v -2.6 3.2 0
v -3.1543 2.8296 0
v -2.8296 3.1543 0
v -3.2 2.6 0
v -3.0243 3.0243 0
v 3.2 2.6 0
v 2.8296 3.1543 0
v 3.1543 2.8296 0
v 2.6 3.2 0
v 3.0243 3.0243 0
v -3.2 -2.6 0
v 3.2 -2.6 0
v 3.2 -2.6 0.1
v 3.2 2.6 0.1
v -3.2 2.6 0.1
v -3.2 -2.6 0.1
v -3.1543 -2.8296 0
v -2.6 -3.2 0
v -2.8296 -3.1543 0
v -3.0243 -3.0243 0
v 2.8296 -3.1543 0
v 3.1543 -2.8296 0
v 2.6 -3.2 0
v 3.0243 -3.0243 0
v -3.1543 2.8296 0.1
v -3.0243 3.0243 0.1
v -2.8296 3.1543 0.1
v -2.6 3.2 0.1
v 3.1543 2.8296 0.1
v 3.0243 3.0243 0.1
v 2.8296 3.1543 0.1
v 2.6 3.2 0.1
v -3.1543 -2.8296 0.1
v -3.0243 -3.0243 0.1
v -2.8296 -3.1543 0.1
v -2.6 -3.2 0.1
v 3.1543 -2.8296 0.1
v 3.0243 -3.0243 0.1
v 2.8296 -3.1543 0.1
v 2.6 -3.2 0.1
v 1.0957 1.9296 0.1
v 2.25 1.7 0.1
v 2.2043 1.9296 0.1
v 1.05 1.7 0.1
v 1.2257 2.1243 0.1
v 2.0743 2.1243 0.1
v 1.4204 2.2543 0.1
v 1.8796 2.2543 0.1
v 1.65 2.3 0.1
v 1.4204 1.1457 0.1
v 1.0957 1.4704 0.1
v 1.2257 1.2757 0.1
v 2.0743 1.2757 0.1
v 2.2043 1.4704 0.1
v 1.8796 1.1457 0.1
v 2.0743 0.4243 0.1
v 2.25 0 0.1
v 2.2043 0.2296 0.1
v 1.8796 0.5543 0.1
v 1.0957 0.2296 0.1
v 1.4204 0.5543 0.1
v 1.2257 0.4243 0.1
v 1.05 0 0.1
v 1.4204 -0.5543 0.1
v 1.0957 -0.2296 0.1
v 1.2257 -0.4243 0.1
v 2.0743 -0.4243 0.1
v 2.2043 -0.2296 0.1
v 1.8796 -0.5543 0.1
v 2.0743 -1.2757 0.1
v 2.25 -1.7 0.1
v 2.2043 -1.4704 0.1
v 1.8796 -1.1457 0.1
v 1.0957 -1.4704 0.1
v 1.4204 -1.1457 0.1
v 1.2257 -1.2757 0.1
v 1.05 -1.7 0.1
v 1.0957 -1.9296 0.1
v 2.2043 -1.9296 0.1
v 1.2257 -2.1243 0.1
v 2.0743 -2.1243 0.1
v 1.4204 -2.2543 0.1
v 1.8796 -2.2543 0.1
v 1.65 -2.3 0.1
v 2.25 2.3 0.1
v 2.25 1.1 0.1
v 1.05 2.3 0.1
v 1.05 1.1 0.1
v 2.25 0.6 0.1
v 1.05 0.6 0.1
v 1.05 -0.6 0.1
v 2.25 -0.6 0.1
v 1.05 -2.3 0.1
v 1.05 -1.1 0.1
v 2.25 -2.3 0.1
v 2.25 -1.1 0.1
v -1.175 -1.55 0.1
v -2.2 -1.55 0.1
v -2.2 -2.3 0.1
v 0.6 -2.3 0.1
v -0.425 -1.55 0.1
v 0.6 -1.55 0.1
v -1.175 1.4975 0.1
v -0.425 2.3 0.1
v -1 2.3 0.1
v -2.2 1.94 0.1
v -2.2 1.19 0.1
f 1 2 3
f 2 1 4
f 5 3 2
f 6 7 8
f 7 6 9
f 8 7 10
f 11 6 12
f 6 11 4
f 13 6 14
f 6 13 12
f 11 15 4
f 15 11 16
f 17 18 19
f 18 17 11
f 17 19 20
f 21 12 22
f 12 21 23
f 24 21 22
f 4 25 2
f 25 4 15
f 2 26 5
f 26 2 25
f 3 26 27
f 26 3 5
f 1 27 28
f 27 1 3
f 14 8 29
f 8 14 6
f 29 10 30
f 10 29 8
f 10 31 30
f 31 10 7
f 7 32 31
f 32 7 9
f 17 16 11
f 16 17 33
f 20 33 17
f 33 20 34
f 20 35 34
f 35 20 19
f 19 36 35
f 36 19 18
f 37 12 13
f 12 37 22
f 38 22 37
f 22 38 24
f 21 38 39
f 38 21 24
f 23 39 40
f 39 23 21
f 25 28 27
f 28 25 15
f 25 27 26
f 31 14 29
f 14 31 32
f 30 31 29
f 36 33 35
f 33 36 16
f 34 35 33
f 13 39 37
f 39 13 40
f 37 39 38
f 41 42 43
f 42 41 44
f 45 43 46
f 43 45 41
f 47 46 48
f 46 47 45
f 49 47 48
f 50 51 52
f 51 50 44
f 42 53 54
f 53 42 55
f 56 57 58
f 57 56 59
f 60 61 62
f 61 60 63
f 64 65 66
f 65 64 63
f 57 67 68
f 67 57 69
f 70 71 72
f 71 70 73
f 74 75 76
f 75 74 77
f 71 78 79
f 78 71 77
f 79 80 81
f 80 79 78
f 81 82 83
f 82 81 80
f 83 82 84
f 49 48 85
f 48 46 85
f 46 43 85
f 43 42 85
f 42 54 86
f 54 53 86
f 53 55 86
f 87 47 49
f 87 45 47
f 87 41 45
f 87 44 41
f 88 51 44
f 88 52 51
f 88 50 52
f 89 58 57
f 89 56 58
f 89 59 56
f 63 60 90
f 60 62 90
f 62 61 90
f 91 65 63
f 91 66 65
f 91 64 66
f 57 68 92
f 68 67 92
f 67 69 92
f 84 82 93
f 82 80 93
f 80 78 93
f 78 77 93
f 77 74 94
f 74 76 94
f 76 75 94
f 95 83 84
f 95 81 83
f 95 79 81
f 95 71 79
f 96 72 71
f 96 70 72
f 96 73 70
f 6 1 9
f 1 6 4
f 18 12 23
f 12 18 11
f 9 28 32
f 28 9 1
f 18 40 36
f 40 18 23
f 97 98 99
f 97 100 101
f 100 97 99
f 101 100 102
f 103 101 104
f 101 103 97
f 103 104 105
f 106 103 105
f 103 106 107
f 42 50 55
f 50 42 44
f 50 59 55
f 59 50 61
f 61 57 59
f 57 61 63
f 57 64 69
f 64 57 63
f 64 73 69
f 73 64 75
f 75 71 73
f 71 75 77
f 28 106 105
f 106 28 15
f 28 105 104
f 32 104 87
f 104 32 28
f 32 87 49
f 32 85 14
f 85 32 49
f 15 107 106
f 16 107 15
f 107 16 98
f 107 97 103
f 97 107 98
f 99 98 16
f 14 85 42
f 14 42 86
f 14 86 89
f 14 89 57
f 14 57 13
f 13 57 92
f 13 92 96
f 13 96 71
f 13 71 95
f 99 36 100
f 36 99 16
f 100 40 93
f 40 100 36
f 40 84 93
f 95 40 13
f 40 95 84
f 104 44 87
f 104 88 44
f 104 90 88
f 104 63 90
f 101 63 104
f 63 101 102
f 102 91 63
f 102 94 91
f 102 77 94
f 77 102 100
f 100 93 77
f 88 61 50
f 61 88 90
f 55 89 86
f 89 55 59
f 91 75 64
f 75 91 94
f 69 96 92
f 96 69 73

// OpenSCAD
// file: ../p/box3u12.scad
use <../lib.scad>
function ldraw_lib__box3u12() = [
// 0 Box with 3 Parallel Faces without Any Edges
// 0 Name: box3u12.dat
// 0 Author: J.C. Tchang [tchang]
// 0 !LDRAW_ORG Primitive UPDATE 2014-02
// 0 !LICENSE Licensed under CC BY 4.0 : see CAreadme.txt
// 
// 0 BFC CERTIFY CCW
  [0,"BFC","CERTIFY"],
  [0,"BFC","CCW"],
// 
// 0 !HISTORY 2014-12-23 [PTadmin] Official Update 2014-02
// 
// 
// 4 16 -1 1 1 1 1 1 1 1 -1 -1 1 -1
  [4,16,-1,1,1,1,1,1,1,1,-1,-1,1,-1],
// 4 16 -1 1 1 -1 0 1 1 0 1 1 1 1
  [4,16,-1,1,1,-1,0,1,1,0,1,1,1,1],
// 4 16 1 1 -1 1 0 -1 -1 0 -1 -1 1 -1
  [4,16,1,1,-1,1,0,-1,-1,0,-1,-1,1,-1],
];
module ldraw_lib__box3u12(step=0, col=false, unit=2/5, alt=false, line=0.2, solid=!$preview)
    makepoly(ldraw_lib__box3u12(), step=step, col=col, unit=unit, alt=alt, line=line, solid=solid);
ldraw_lib__box3u12(line=0.2);
// file: ../p/7-16ndis.scad
use <../lib.scad>
function ldraw_lib__7_16ndis() = [
// 0 Disc Negative 0.4375
// 0 Name: 7-16ndis.dat
// 0 Author: Alex Taylor [anathema]
// 0 !LDRAW_ORG Primitive UPDATE 2010-01
// 0 !LICENSE Licensed under CC BY 4.0 : see CAreadme.txt
// 
// 0 BFC CERTIFY CCW
  [0,"BFC","CERTIFY"],
  [0,"BFC","CCW"],
// 
// 0 !HISTORY 2010-04-05 [PTadmin] Official Update 2010-01
// 
// 
// 3 16 1 0 1 0.9239 0 0.3827 1 0 0
  [3,16,1,0,1,0.9239,0,0.3827,1,0,0],
// 3 16 1 0 1 0.7071 0 0.7071 0.9239 0 0.3827
  [3,16,1,0,1,0.7071,0,0.7071,0.9239,0,0.3827],
// 3 16 1 0 1 0.3827 0 0.9239 0.7071 0 0.7071
  [3,16,1,0,1,0.3827,0,0.9239,0.7071,0,0.7071],
// 3 16 1 0 1 0 0 1 0.3827 0 0.9239
  [3,16,1,0,1,0,0,1,0.3827,0,0.9239],
// 3 16 -1 0 1 -0.3827 0 0.9239 0 0 1
  [3,16,-1,0,1,-0.3827,0,0.9239,0,0,1],
// 3 16 -1 0 1 -0.7071 0 0.7071 -0.3827 0 0.9239
  [3,16,-1,0,1,-0.7071,0,0.7071,-0.3827,0,0.9239],
// 3 16 -1 0 1 -0.9239 0 0.3827 -0.7071 0 0.7071
  [3,16,-1,0,1,-0.9239,0,0.3827,-0.7071,0,0.7071],
// 0
];
module ldraw_lib__7_16ndis(step=0, col=false, unit=2/5, alt=false, line=0.2, solid=!$preview)
    makepoly(ldraw_lib__7_16ndis(), step=step, col=col, unit=unit, alt=alt, line=line, solid=solid);
ldraw_lib__7_16ndis(line=0.2);
// file: ../p/3-16ndis.scad
use <../lib.scad>
function ldraw_lib__3_16ndis() = [
// 0 Disc Negative 0.1875
// 0 Name: 3-16ndis.dat
// 0 Author: Magnus Forsberg [MagFors]
// 0 !LDRAW_ORG Primitive UPDATE 2024-01
// 0 !LICENSE Licensed under CC BY 4.0 : see CAreadme.txt
// 
// 0 BFC CERTIFY CCW
  [0,"BFC","CERTIFY"],
  [0,"BFC","CCW"],
// 
// 0 !HISTORY 2009-05-02 [PTadmin] Official Update 2009-01
// 0 !HISTORY 2024-01-03 [MagFors] Complete regeneration, original by guyvivan
// 0 !HISTORY 2024-01-29 [OrionP] Official Update 2024-01
// 
// 3 16 1 0 1 0.9239 0 0.3827 1 0 0
  [3,16,1,0,1,0.9239,0,0.3827,1,0,0],
// 3 16 1 0 1 0.7071 0 0.7071 0.9239 0 0.3827
  [3,16,1,0,1,0.7071,0,0.7071,0.9239,0,0.3827],
// 3 16 1 0 1 0.3827 0 0.9239 0.7071 0 0.7071
  [3,16,1,0,1,0.3827,0,0.9239,0.7071,0,0.7071],
// 0 // Build by LDPartEditor (PrimGen 2.X)
];
module ldraw_lib__3_16ndis(step=0, col=false, unit=2/5, alt=false, line=0.2, solid=!$preview)
    makepoly(ldraw_lib__3_16ndis(), step=step, col=col, unit=unit, alt=alt, line=line, solid=solid);
ldraw_lib__3_16ndis(line=0.2);
// file: ../p/3-16chrd.scad
use <../lib.scad>
function ldraw_lib__3_16chrd() = [
// 0 Chord 0.1875
// 0 Name: 3-16chrd.dat
// 0 Author: Niels Karsdorp [nielsk]
// 0 !LDRAW_ORG Primitive UPDATE 2009-01
// 0 !LICENSE Licensed under CC BY 4.0 : see CAreadme.txt
// 
// 0 BFC CERTIFY CCW
  [0,"BFC","CERTIFY"],
  [0,"BFC","CCW"],
// 
// 0 !HISTORY 2009-05-02 [PTadmin] Official Update 2009-01
// 
// 
// 4 16 1 0 0 0.9239 0 0.3827 0.7071 0 0.7071 0.3827 0 0.9239
  [4,16,1,0,0,0.9239,0,0.3827,0.7071,0,0.7071,0.3827,0,0.9239],
// 0
// 
];
module ldraw_lib__3_16chrd(step=0, col=false, unit=2/5, alt=false, line=0.2, solid=!$preview)
    makepoly(ldraw_lib__3_16chrd(), step=step, col=col, unit=unit, alt=alt, line=line, solid=solid);
ldraw_lib__3_16chrd(line=0.2);
// file: ../p/2-4chrd.scad
use <../lib.scad>
function ldraw_lib__2_4chrd() = [
// 0 Chord 0.5
// 0 Name: 2-4chrd.dat
// 0 Author: Philippe Hurbain [Philo]
// 0 !LDRAW_ORG Primitive UPDATE 2014-01
// 0 !LICENSE Licensed under CC BY 4.0 : see CAreadme.txt
// 
// 0 BFC CERTIFY CCW
  [0,"BFC","CERTIFY"],
  [0,"BFC","CCW"],
// 
// 0 !HISTORY 2014-06-21 [PTadmin] Official Update 2014-01
// 
// 
// 4 16 0.9239 0 0.3827 -0.9239 0 0.3827 -1 0 0 1 0 0
  [4,16,0.9239,0,0.3827,-0.9239,0,0.3827,-1,0,0,1,0,0],
// 4 16 0.7071 0 0.7071 -0.7071 0 0.7071 -0.9239 0 0.3827 0.9239 0 0.3827
  [4,16,0.7071,0,0.7071,-0.7071,0,0.7071,-0.9239,0,0.3827,0.9239,0,0.3827],
// 4 16 0.3827 0 0.9239 -0.3827 0 0.9239 -0.7071 0 0.7071 0.7071 0 0.7071
  [4,16,0.3827,0,0.9239,-0.3827,0,0.9239,-0.7071,0,0.7071,0.7071,0,0.7071],
// 3 16 0 0 1 -0.3827 0 0.9239 0.3827 0 0.9239
  [3,16,0,0,1,-0.3827,0,0.9239,0.3827,0,0.9239],
];
module ldraw_lib__2_4chrd(step=0, col=false, unit=2/5, alt=false, line=0.2, solid=!$preview)
    makepoly(ldraw_lib__2_4chrd(), step=step, col=col, unit=unit, alt=alt, line=line, solid=solid);
ldraw_lib__2_4chrd(line=0.2);
// file: ../p/1-4cyli.scad
use <../lib.scad>
function ldraw_lib__1_4cyli() = [
// 0 Cylinder 0.25
// 0 Name: 1-4cyli.dat
// 0 Author: James Jessiman
// 0 !LDRAW_ORG Primitive UPDATE 2012-01
// 0 !LICENSE Licensed under CC BY 4.0 : see CAreadme.txt
// 
// 0 BFC CERTIFY CCW
  [0,"BFC","CERTIFY"],
  [0,"BFC","CCW"],
// 
// 0 !HISTORY 2002-03-23 [sbliss] Added BFC statement.
// 0 !HISTORY 2002-04-25 [PTadmin] Official Update 2002-02
// 0 !HISTORY 2007-06-22 [PTadmin] Header formatted for Contributor Agreement
// 0 !HISTORY 2008-07-01 [PTadmin] Official Update 2008-01
// 0 !HISTORY 2012-02-16 [Philo] Changed to CCW
// 0 !HISTORY 2012-03-30 [PTadmin] Official Update 2012-01
// 
// 
// 4 16 1 1 0 0.9239 1 0.3827 0.9239 0 0.3827 1 0 0
  [4,16,1,1,0,0.9239,1,0.3827,0.9239,0,0.3827,1,0,0],
// 5 24 1 0 0 1 1 0 0.9239 0 0.3827 1 0 -1
  [5,24,1,0,0,1,1,0,0.9239,0,0.3827,1,0,-1],
// 4 16 0.9239 1 0.3827 0.7071 1 0.7071 0.7071 0 0.7071 0.9239 0 0.3827
  [4,16,0.9239,1,0.3827,0.7071,1,0.7071,0.7071,0,0.7071,0.9239,0,0.3827],
// 5 24 0.9239 0 0.3827 0.9239 1 0.3827 0.7071 0 0.7071 1 0 0
  [5,24,0.9239,0,0.3827,0.9239,1,0.3827,0.7071,0,0.7071,1,0,0],
// 4 16 0.7071 1 0.7071 0.3827 1 0.9239 0.3827 0 0.9239 0.7071 0 0.7071
  [4,16,0.7071,1,0.7071,0.3827,1,0.9239,0.3827,0,0.9239,0.7071,0,0.7071],
// 5 24 0.7071 0 0.7071 0.7071 1 0.7071 0.3827 0 0.9239 0.9239 0 0.3827
  [5,24,0.7071,0,0.7071,0.7071,1,0.7071,0.3827,0,0.9239,0.9239,0,0.3827],
// 4 16 0.3827 1 0.9239 0 1 1 0 0 1 0.3827 0 0.9239
  [4,16,0.3827,1,0.9239,0,1,1,0,0,1,0.3827,0,0.9239],
// 5 24 0.3827 0 0.9239 0.3827 1 0.9239 0 0 1 0.7071 0 0.7071
  [5,24,0.3827,0,0.9239,0.3827,1,0.9239,0,0,1,0.7071,0,0.7071],
// 5 24 0 0 1 0 1 1 0.3827 0 0.9239 -1 0 1
  [5,24,0,0,1,0,1,1,0.3827,0,0.9239,-1,0,1],
];
module ldraw_lib__1_4cyli(step=0, col=false, unit=2/5, alt=false, line=0.2, solid=!$preview)
    makepoly(ldraw_lib__1_4cyli(), step=step, col=col, unit=unit, alt=alt, line=line, solid=solid);
ldraw_lib__1_4cyli(line=0.2);
// file: ../p/1-4chrd.scad
use <../lib.scad>
function ldraw_lib__1_4chrd() = [
// 0 Chord 0.25
// 0 Name: 1-4chrd.dat
// 0 Author: Max Martin Richter [MMR1988]
// 0 !LDRAW_ORG Primitive UPDATE 2023-05
// 0 !LICENSE Licensed under CC BY 4.0 : see CAreadme.txt
// 
// 0 BFC CERTIFY CCW
  [0,"BFC","CERTIFY"],
  [0,"BFC","CCW"],
// 
// 0 !HISTORY 2004-04-22 [PTadmin] Official Update 2004-02
// 0 !HISTORY 2007-10-09 [PTadmin] Header formatted for Contributor Agreement
// 0 !HISTORY 2008-07-01 [PTadmin] Official Update 2008-01
// 0 !HISTORY 2012-08-02 [MMR1988] Re-creation with PrimGen2 and Rectifier
// 0 !HISTORY 2012-08-09 [PTadmin] Official Update 2012-02
// 0 !HISTORY 2023-10-27 [OrionP] Change author to MMR1988 from hafhead
// 0 !HISTORY 2023-10-31 [OrionP] Official Update 2023-05
// 
// 4 16 0.9239 0 0.3827 0.3827 0 0.9239 0 0 1 1 0 0
  [4,16,0.9239,0,0.3827,0.3827,0,0.9239,0,0,1,1,0,0],
// 3 16 0.7071 0 0.7071 0.3827 0 0.9239 0.9239 0 0.3827
  [3,16,0.7071,0,0.7071,0.3827,0,0.9239,0.9239,0,0.3827],
];
module ldraw_lib__1_4chrd(step=0, col=false, unit=2/5, alt=false, line=0.2, solid=!$preview)
    makepoly(ldraw_lib__1_4chrd(), step=step, col=col, unit=unit, alt=alt, line=line, solid=solid);
ldraw_lib__1_4chrd(line=0.2);
// main file
use <../lib.scad>
use <../p/1-4chrd.scad>
use <../p/1-4cyli.scad>
use <../p/2-4chrd.scad>
use <../p/3-16chrd.scad>
use <../p/3-16ndis.scad>
use <../p/7-16ndis.scad>
use <../p/box3u12.scad>
function ldraw_lib__6142275b() = [
// 0 Sticker  0.8 x  0.8 with White Number 1 and  3 Dark Grey Circles Right on Red Background
// 0 Name: 6142275b.dat
// 0 Author: Massimo Maso [Sirio]
// 0 !LDRAW_ORG Part UPDATE 2024-01
// 0 !LICENSE Licensed under CC BY 4.0 : see CAreadme.txt
// 
// 0 BFC CERTIFY CCW
  [0,"BFC","CERTIFY"],
  [0,"BFC","CCW"],
// 
// 0 !KEYWORDS Audi, e-tron, quattro, R18, Set 75872, Speed Champions
// 
// 0 !HISTORY 2024-01-29 [OrionP] Official Update 2024-01
// 
// 
// 0 // Primitives
// 
// 1 16 -6.5 0 6.5 -1.5 0 0 0 -1 0 0 0 1.5 1-4chrd.dat
  [1,16,-6.5,0,6.5,-1.5,0,0,0,-1,0,0,0,1.5, ldraw_lib__1_4chrd()],
// 1 16 6.5 0 6.5 1.5 0 0 0 -1 0 0 0 1.5 1-4chrd.dat
  [1,16,6.5,0,6.5,1.5,0,0,0,-1,0,0,0,1.5, ldraw_lib__1_4chrd()],
// 1 16 0 -.25 0 0 0 8 0 .25 0 -6.5 0 0 box3u12.dat
  [1,16,0,-.25,0,0,0,8,0,.25,0,-6.5,0,0, ldraw_lib__box3u12()],
// 1 16 -6.5 0 -6.5 -1.5 0 0 0 -1 0 0 0 -1.5 1-4chrd.dat
  [1,16,-6.5,0,-6.5,-1.5,0,0,0,-1,0,0,0,-1.5, ldraw_lib__1_4chrd()],
// 1 16 6.5 0 -6.5 1.5 0 0 0 -1 0 0 0 -1.5 1-4chrd.dat
  [1,16,6.5,0,-6.5,1.5,0,0,0,-1,0,0,0,-1.5, ldraw_lib__1_4chrd()],
// 1 16 -6.5 0 6.5 -1.5 0 0 0 -.25 0 0 0 1.5 1-4cyli.dat
  [1,16,-6.5,0,6.5,-1.5,0,0,0,-.25,0,0,0,1.5, ldraw_lib__1_4cyli()],
// 1 16 6.5 0 6.5 1.5 0 0 0 -.25 0 0 0 1.5 1-4cyli.dat
  [1,16,6.5,0,6.5,1.5,0,0,0,-.25,0,0,0,1.5, ldraw_lib__1_4cyli()],
// 1 16 -6.5 0 -6.5 -1.5 0 0 0 -.25 0 0 0 -1.5 1-4cyli.dat
  [1,16,-6.5,0,-6.5,-1.5,0,0,0,-.25,0,0,0,-1.5, ldraw_lib__1_4cyli()],
// 1 16 6.5 0 -6.5 1.5 0 0 0 -.25 0 0 0 -1.5 1-4cyli.dat
  [1,16,6.5,0,-6.5,1.5,0,0,0,-.25,0,0,0,-1.5, ldraw_lib__1_4cyli()],
// 1 4 -6.5 -.25 6.5 -1.5 0 0 0 1 0 0 0 1.5 1-4chrd.dat
  [1,4,-6.5,-.25,6.5,-1.5,0,0,0,1,0,0,0,1.5, ldraw_lib__1_4chrd()],
// 1 4 6.5 -.25 6.5 1.5 0 0 0 1 0 0 0 1.5 1-4chrd.dat
  [1,4,6.5,-.25,6.5,1.5,0,0,0,1,0,0,0,1.5, ldraw_lib__1_4chrd()],
// 1 4 -6.5 -.25 -6.5 -1.5 0 0 0 1 0 0 0 -1.5 1-4chrd.dat
  [1,4,-6.5,-.25,-6.5,-1.5,0,0,0,1,0,0,0,-1.5, ldraw_lib__1_4chrd()],
// 1 4 6.5 -.25 -6.5 1.5 0 0 0 1 0 0 0 -1.5 1-4chrd.dat
  [1,4,6.5,-.25,-6.5,1.5,0,0,0,1,0,0,0,-1.5, ldraw_lib__1_4chrd()],
// 1 72 4.125 -.25 4.25 1.5 0 0 0 1 0 0 0 1.5 2-4chrd.dat
  [1,72,4.125,-.25,4.25,1.5,0,0,0,1,0,0,0,1.5, ldraw_lib__2_4chrd()],
// 1 72 4.125 -.25 4.25 -1.5 0 0 0 1 0 0 0 -1.5 3-16chrd.dat
  [1,72,4.125,-.25,4.25,-1.5,0,0,0,1,0,0,0,-1.5, ldraw_lib__3_16chrd()],
// 1 72 4.125 -.25 4.25 1.5 0 0 0 1 0 0 0 -1.5 3-16chrd.dat
  [1,72,4.125,-.25,4.25,1.5,0,0,0,1,0,0,0,-1.5, ldraw_lib__3_16chrd()],
// 1 72 4.125 -.25 0 1.5 0 0 0 1 0 0 0 1.5 3-16chrd.dat
  [1,72,4.125,-.25,0,1.5,0,0,0,1,0,0,0,1.5, ldraw_lib__3_16chrd()],
// 1 72 4.125 -.25 0 -1.5 0 0 0 1 0 0 0 1.5 3-16chrd.dat
  [1,72,4.125,-.25,0,-1.5,0,0,0,1,0,0,0,1.5, ldraw_lib__3_16chrd()],
// 1 72 4.125 -.25 0 -1.5 0 0 0 1 0 0 0 -1.5 3-16chrd.dat
  [1,72,4.125,-.25,0,-1.5,0,0,0,1,0,0,0,-1.5, ldraw_lib__3_16chrd()],
// 1 72 4.125 -.25 0 1.5 0 0 0 1 0 0 0 -1.5 3-16chrd.dat
  [1,72,4.125,-.25,0,1.5,0,0,0,1,0,0,0,-1.5, ldraw_lib__3_16chrd()],
// 1 72 4.125 -.25 -4.25 1.5 0 0 0 1 0 0 0 1.5 3-16chrd.dat
  [1,72,4.125,-.25,-4.25,1.5,0,0,0,1,0,0,0,1.5, ldraw_lib__3_16chrd()],
// 1 72 4.125 -.25 -4.25 -1.5 0 0 0 1 0 0 0 1.5 3-16chrd.dat
  [1,72,4.125,-.25,-4.25,-1.5,0,0,0,1,0,0,0,1.5, ldraw_lib__3_16chrd()],
// 1 72 4.125 -.25 -4.25 1.5 0 0 0 1 0 0 0 -1.5 2-4chrd.dat
  [1,72,4.125,-.25,-4.25,1.5,0,0,0,1,0,0,0,-1.5, ldraw_lib__2_4chrd()],
// 1 4 4.125 -.25 4.25 0 0 1.5 0 1 0 1.5 0 0 7-16ndis.dat
  [1,4,4.125,-.25,4.25,0,0,1.5,0,1,0,1.5,0,0, ldraw_lib__7_16ndis()],
// 1 4 4.125 -.25 4.25 0 0 -1.5 0 1 0 1.5 0 0 7-16ndis.dat
  [1,4,4.125,-.25,4.25,0,0,-1.5,0,1,0,1.5,0,0, ldraw_lib__7_16ndis()],
// 1 4 4.125 -.25 0 1.5 0 0 0 1 0 0 0 1.5 3-16ndis.dat
  [1,4,4.125,-.25,0,1.5,0,0,0,1,0,0,0,1.5, ldraw_lib__3_16ndis()],
// 1 4 4.125 -.25 0 -1.5 0 0 0 1 0 0 0 1.5 3-16ndis.dat
  [1,4,4.125,-.25,0,-1.5,0,0,0,1,0,0,0,1.5, ldraw_lib__3_16ndis()],
// 1 4 4.125 -.25 0 -1.5 0 0 0 1 0 0 0 -1.5 3-16ndis.dat
  [1,4,4.125,-.25,0,-1.5,0,0,0,1,0,0,0,-1.5, ldraw_lib__3_16ndis()],
// 1 4 4.125 -.25 0 1.5 0 0 0 1 0 0 0 -1.5 3-16ndis.dat
  [1,4,4.125,-.25,0,1.5,0,0,0,1,0,0,0,-1.5, ldraw_lib__3_16ndis()],
// 1 4 4.125 -.25 -4.25 0 0 -1.5 0 1 0 -1.5 0 0 7-16ndis.dat
  [1,4,4.125,-.25,-4.25,0,0,-1.5,0,1,0,-1.5,0,0, ldraw_lib__7_16ndis()],
// 1 4 4.125 -.25 -4.25 0 0 1.5 0 1 0 -1.5 0 0 7-16ndis.dat
  [1,4,4.125,-.25,-4.25,0,0,1.5,0,1,0,-1.5,0,0, ldraw_lib__7_16ndis()],
// 0 // Bottom faces
// 4 16 6.5 0 8 8 0 6.5 -8 0 6.5 -6.5 0 8
  [4,16,6.5,0,8,8,0,6.5,-8,0,6.5,-6.5,0,8],
// 4 16 6.5 0 -8 -6.5 0 -8 -8 0 -6.5 8 0 -6.5
  [4,16,6.5,0,-8,-6.5,0,-8,-8,0,-6.5,8,0,-6.5],
// 0 // Lateral faces
// 4 16 -6.5 0 8 -6.5 -.25 8 6.5 -.25 8 6.5 0 8
  [4,16,-6.5,0,8,-6.5,-.25,8,6.5,-.25,8,6.5,0,8],
// 4 16 -6.5 0 -8 6.5 0 -8 6.5 -.25 -8 -6.5 -.25 -8
  [4,16,-6.5,0,-8,6.5,0,-8,6.5,-.25,-8,-6.5,-.25,-8],
// 0 // Top faces
// 0 // White number 1
// 3 15 -2.9375 -.25 -3.875 -5.5 -.25 -3.875 -5.5 -.25 -5.75
  [3,15,-2.9375,-.25,-3.875,-5.5,-.25,-3.875,-5.5,-.25,-5.75],
// 4 15 -2.9375 -.25 -3.875 -5.5 -.25 -5.75 1.5 -.25 -5.75 -1.0625 -.25 -3.875
  [4,15,-2.9375,-.25,-3.875,-5.5,-.25,-5.75,1.5,-.25,-5.75,-1.0625,-.25,-3.875],
// 3 15 -1.0625 -.25 -3.875 1.5 -.25 -5.75 1.5 -.25 -3.875
  [3,15,-1.0625,-.25,-3.875,1.5,-.25,-5.75,1.5,-.25,-3.875],
// 4 15 -1.0625 -.25 -3.875 -1.0625 -.25 5.75 -2.9375 -.25 3.74375 -2.9375 -.25 -3.875
  [4,15,-1.0625,-.25,-3.875,-1.0625,-.25,5.75,-2.9375,-.25,3.74375,-2.9375,-.25,-3.875],
// 3 15 -2.9375 -.25 3.74375 -1.0625 -.25 5.75 -2.5 -.25 5.75
  [3,15,-2.9375,-.25,3.74375,-1.0625,-.25,5.75,-2.5,-.25,5.75],
// 4 15 -2.9375 -.25 3.74375 -2.5 -.25 5.75 -5.5 -.25 4.85 -5.5 -.25 2.975
  [4,15,-2.9375,-.25,3.74375,-2.5,-.25,5.75,-5.5,-.25,4.85,-5.5,-.25,2.975],
// 0 // Grey faces
// 4 72 2.625 -.25 4.25 3.55095 -.25 2.86415 4.69905 -.25 2.86415 5.625 -.25 4.25
  [4,72,2.625,-.25,4.25,3.55095,-.25,2.86415,4.69905,-.25,2.86415,5.625,-.25,4.25],
// 4 72 3.55095 -.25 2.86415 3.55095 -.25 1.38585 4.69905 -.25 1.38585 4.69905 -.25 2.86415
  [4,72,3.55095,-.25,2.86415,3.55095,-.25,1.38585,4.69905,-.25,1.38585,4.69905,-.25,2.86415],
// 4 72 3.55095 -.25 1.38585 2.625 -.25 0 5.625 -.25 0 4.69905 -.25 1.38585
  [4,72,3.55095,-.25,1.38585,2.625,-.25,0,5.625,-.25,0,4.69905,-.25,1.38585],
// 4 72 5.625 -.25 0 2.625 -.25 0 3.55095 -.25 -1.38585 4.69905 -.25 -1.38585
  [4,72,5.625,-.25,0,2.625,-.25,0,3.55095,-.25,-1.38585,4.69905,-.25,-1.38585],
// 4 72 4.69905 -.25 -1.38585 3.55095 -.25 -1.38585 3.55095 -.25 -2.86415 4.69905 -.25 -2.86415
  [4,72,4.69905,-.25,-1.38585,3.55095,-.25,-1.38585,3.55095,-.25,-2.86415,4.69905,-.25,-2.86415],
// 4 72 3.55095 -.25 -2.86415 2.625 -.25 -4.25 5.625 -.25 -4.25 4.69905 -.25 -2.86415
  [4,72,3.55095,-.25,-2.86415,2.625,-.25,-4.25,5.625,-.25,-4.25,4.69905,-.25,-2.86415],
// 0 // Red faces
// 4 4 -6.5 -.25 8 -8 -.25 6.5 -5.5 -.25 4.85 -2.5 -.25 5.75
  [4,4,-6.5,-.25,8,-8,-.25,6.5,-5.5,-.25,4.85,-2.5,-.25,5.75],
// 3 4 -6.5 -.25 8 -2.5 -.25 5.75 -1.0625 -.25 5.75
  [3,4,-6.5,-.25,8,-2.5,-.25,5.75,-1.0625,-.25,5.75],
// 4 4 -6.5 -.25 8 -1.0625 -.25 5.75 2.625 -.25 5.75 6.5 -.25 8
  [4,4,-6.5,-.25,8,-1.0625,-.25,5.75,2.625,-.25,5.75,6.5,-.25,8],
// 3 4 6.5 -.25 8 2.625 -.25 5.75 4.125 -.25 5.75
  [3,4,6.5,-.25,8,2.625,-.25,5.75,4.125,-.25,5.75],
// 4 4 6.5 -.25 8 4.125 -.25 5.75 5.625 -.25 5.75 8 -.25 6.5
  [4,4,6.5,-.25,8,4.125,-.25,5.75,5.625,-.25,5.75,8,-.25,6.5],
// 3 4 -8 -.25 6.5 -5.5 -.25 2.975 -5.5 -.25 4.85
  [3,4,-8,-.25,6.5,-5.5,-.25,2.975,-5.5,-.25,4.85],
// 4 4 -8 -.25 6.5 -8 -.25 -6.5 -5.5 -.25 -3.875 -5.5 -.25 2.975
  [4,4,-8,-.25,6.5,-8,-.25,-6.5,-5.5,-.25,-3.875,-5.5,-.25,2.975],
// 4 4 -5.5 -.25 -3.875 -2.9375 -.25 -3.875 -2.9375 -.25 3.74375 -5.5 -.25 2.975
  [4,4,-5.5,-.25,-3.875,-2.9375,-.25,-3.875,-2.9375,-.25,3.74375,-5.5,-.25,2.975],
// 3 4 -5.5 -.25 -5.75 -5.5 -.25 -3.875 -8 -.25 -6.5
  [3,4,-5.5,-.25,-5.75,-5.5,-.25,-3.875,-8,-.25,-6.5],
// 3 4 8 -.25 6.5 5.625 -.25 5.75 5.625 -.25 4.25
  [3,4,8,-.25,6.5,5.625,-.25,5.75,5.625,-.25,4.25],
// 3 4 8 -.25 6.5 5.625 -.25 4.25 5.625 -.25 2.75
  [3,4,8,-.25,6.5,5.625,-.25,4.25,5.625,-.25,2.75],
// 3 4 8 -.25 6.5 5.625 -.25 2.75 5.625 -.25 1.5
  [3,4,8,-.25,6.5,5.625,-.25,2.75,5.625,-.25,1.5],
// 3 4 8 -.25 6.5 5.625 -.25 1.5 5.625 -.25 0
  [3,4,8,-.25,6.5,5.625,-.25,1.5,5.625,-.25,0],
// 3 4 8 -.25 6.5 5.625 -.25 0 8 -.25 -6.5
  [3,4,8,-.25,6.5,5.625,-.25,0,8,-.25,-6.5],
// 3 4 8 -.25 -6.5 5.625 -.25 0 5.625 -.25 -1.5
  [3,4,8,-.25,-6.5,5.625,-.25,0,5.625,-.25,-1.5],
// 3 4 8 -.25 -6.5 5.625 -.25 -1.5 5.625 -.25 -2.75
  [3,4,8,-.25,-6.5,5.625,-.25,-1.5,5.625,-.25,-2.75],
// 3 4 8 -.25 -6.5 5.625 -.25 -2.75 5.625 -.25 -4.25
  [3,4,8,-.25,-6.5,5.625,-.25,-2.75,5.625,-.25,-4.25],
// 3 4 8 -.25 -6.5 5.625 -.25 -4.25 5.625 -.25 -5.75
  [3,4,8,-.25,-6.5,5.625,-.25,-4.25,5.625,-.25,-5.75],
// 4 4 -6.5 -.25 -8 1.5 -.25 -5.75 -5.5 -.25 -5.75 -8 -.25 -6.5
  [4,4,-6.5,-.25,-8,1.5,-.25,-5.75,-5.5,-.25,-5.75,-8,-.25,-6.5],
// 4 4 -6.5 -.25 -8 6.5 -.25 -8 2.625 -.25 -5.75 1.5 -.25 -5.75
  [4,4,-6.5,-.25,-8,6.5,-.25,-8,2.625,-.25,-5.75,1.5,-.25,-5.75],
// 3 4 6.5 -.25 -8 4.125 -.25 -5.75 2.625 -.25 -5.75
  [3,4,6.5,-.25,-8,4.125,-.25,-5.75,2.625,-.25,-5.75],
// 4 4 6.5 -.25 -8 8 -.25 -6.5 5.625 -.25 -5.75 4.125 -.25 -5.75
  [4,4,6.5,-.25,-8,8,-.25,-6.5,5.625,-.25,-5.75,4.125,-.25,-5.75],
// 3 4 -1.0625 -.25 5.75 2.625 -.25 4.25 2.625 -.25 5.75
  [3,4,-1.0625,-.25,5.75,2.625,-.25,4.25,2.625,-.25,5.75],
// 3 4 -1.0625 -.25 5.75 2.625 -.25 2.75 2.625 -.25 4.25
  [3,4,-1.0625,-.25,5.75,2.625,-.25,2.75,2.625,-.25,4.25],
// 3 4 -1.0625 -.25 5.75 2.625 -.25 1.5 2.625 -.25 2.75
  [3,4,-1.0625,-.25,5.75,2.625,-.25,1.5,2.625,-.25,2.75],
// 3 4 -1.0625 -.25 5.75 2.625 -.25 0 2.625 -.25 1.5
  [3,4,-1.0625,-.25,5.75,2.625,-.25,0,2.625,-.25,1.5],
// 4 4 -1.0625 -.25 5.75 -1.0625 -.25 -3.875 1.5 -.25 -3.875 2.625 -.25 0
  [4,4,-1.0625,-.25,5.75,-1.0625,-.25,-3.875,1.5,-.25,-3.875,2.625,-.25,0],
// 3 4 1.5 -.25 -3.875 2.625 -.25 -1.5 2.625 -.25 0
  [3,4,1.5,-.25,-3.875,2.625,-.25,-1.5,2.625,-.25,0],
// 3 4 1.5 -.25 -3.875 2.625 -.25 -2.75 2.625 -.25 -1.5
  [3,4,1.5,-.25,-3.875,2.625,-.25,-2.75,2.625,-.25,-1.5],
// 4 4 1.5 -.25 -3.875 1.5 -.25 -5.75 2.625 -.25 -4.25 2.625 -.25 -2.75
  [4,4,1.5,-.25,-3.875,1.5,-.25,-5.75,2.625,-.25,-4.25,2.625,-.25,-2.75],
// 3 4 1.5 -.25 -5.75 2.625 -.25 -5.75 2.625 -.25 -4.25
  [3,4,1.5,-.25,-5.75,2.625,-.25,-5.75,2.625,-.25,-4.25],
// 4 4 2.625 -.25 2.75 2.625 -.25 1.5 3.55095 -.25 1.38585 3.55095 -.25 2.86415
  [4,4,2.625,-.25,2.75,2.625,-.25,1.5,3.55095,-.25,1.38585,3.55095,-.25,2.86415],
// 4 4 4.69905 -.25 2.86415 4.69905 -.25 1.38585 5.625 -.25 1.5 5.625 -.25 2.75
  [4,4,4.69905,-.25,2.86415,4.69905,-.25,1.38585,5.625,-.25,1.5,5.625,-.25,2.75],
// 4 4 2.625 -.25 -1.5 2.625 -.25 -2.75 3.55095 -.25 -2.86415 3.55095 -.25 -1.38585
  [4,4,2.625,-.25,-1.5,2.625,-.25,-2.75,3.55095,-.25,-2.86415,3.55095,-.25,-1.38585],
// 4 4 4.69905 -.25 -1.38585 4.69905 -.25 -2.86415 5.625 -.25 -2.75 5.625 -.25 -1.5
  [4,4,4.69905,-.25,-1.38585,4.69905,-.25,-2.86415,5.625,-.25,-2.75,5.625,-.25,-1.5],
];
module ldraw_lib__6142275b(step=0, col=false, unit=2/5, alt=false, line=0.2, solid=!$preview)
    makepoly(ldraw_lib__6142275b(), step=step, col=col, unit=unit, alt=alt, line=line, solid=solid);
ldraw_lib__6142275b(line=0.2);
